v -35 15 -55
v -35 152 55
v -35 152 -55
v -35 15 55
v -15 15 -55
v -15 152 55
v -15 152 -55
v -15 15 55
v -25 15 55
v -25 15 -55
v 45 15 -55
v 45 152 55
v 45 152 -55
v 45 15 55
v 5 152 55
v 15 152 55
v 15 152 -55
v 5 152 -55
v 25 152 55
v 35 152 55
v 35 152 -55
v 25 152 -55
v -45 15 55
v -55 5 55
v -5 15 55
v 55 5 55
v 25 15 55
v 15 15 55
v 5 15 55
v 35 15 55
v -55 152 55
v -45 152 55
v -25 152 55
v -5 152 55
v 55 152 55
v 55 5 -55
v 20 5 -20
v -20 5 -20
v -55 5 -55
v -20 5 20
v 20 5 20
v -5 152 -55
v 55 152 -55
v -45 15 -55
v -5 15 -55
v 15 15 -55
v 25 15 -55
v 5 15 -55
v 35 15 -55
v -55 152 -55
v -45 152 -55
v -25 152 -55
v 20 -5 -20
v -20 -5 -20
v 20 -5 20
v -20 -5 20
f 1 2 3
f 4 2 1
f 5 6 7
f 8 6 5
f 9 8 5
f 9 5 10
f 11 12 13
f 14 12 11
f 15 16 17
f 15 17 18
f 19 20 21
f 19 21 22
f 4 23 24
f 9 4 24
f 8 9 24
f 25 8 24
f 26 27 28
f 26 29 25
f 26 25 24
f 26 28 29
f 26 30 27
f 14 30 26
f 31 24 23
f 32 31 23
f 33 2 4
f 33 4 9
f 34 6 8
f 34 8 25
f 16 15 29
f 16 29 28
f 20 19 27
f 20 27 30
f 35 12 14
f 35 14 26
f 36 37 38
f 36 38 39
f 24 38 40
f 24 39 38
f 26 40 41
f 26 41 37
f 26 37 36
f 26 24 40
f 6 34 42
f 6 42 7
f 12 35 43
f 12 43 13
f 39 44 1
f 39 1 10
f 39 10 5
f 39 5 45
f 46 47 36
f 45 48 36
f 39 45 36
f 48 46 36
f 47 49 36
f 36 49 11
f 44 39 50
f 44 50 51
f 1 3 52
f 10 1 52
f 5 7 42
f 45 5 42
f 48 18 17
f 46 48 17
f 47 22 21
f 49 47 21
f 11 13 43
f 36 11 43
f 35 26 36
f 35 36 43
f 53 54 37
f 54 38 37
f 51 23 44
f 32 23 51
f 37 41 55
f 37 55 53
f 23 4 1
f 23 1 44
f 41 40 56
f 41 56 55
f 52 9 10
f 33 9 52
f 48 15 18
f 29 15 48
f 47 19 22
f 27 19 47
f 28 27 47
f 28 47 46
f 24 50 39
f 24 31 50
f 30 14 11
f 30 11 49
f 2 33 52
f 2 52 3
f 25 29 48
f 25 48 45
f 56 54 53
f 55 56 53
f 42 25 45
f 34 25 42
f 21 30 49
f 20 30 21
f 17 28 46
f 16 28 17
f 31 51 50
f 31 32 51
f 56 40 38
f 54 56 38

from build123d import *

# Parameters (mm, degrees)
SKETCH3_W           = 40
SKETCH3_H           = 40
BOSS_EXTRUDE2_DEPTH = 5
BOSS_EXTRUDE3_DEPTH = 55


with BuildPart() as part:
    # Sketch3 → Boss-Extrude2 (new body, symmetric)
    with BuildSketch(Plane(origin=(0, 0, 0), x_dir=(1, 0, 0), z_dir=(0, 1, 0))):
        Rectangle(SKETCH3_W, SKETCH3_H)
    extrude(amount=BOSS_EXTRUDE2_DEPTH, both=True)

    # Sketch9 → Boss-Extrude3 (add, symmetric)
    with BuildSketch(Plane.XY):
        Polygon((-55, 5), (55, 5), (55, 152), (45, 152), (45, 15), (35, 15), (35, 152), (25, 152), (25, 15), (15, 15), (15, 152), (5, 152), (5, 15), (-5, 15), (-5, 152), (-15, 152), (-15, 15), (-25, 15), (-25, 152), (-35, 152), (-35, 15), (-45, 15), (-45, 152), (-55, 152), align=None)
    extrude(amount=BOSS_EXTRUDE3_DEPTH, both=True)


solid = part.part
